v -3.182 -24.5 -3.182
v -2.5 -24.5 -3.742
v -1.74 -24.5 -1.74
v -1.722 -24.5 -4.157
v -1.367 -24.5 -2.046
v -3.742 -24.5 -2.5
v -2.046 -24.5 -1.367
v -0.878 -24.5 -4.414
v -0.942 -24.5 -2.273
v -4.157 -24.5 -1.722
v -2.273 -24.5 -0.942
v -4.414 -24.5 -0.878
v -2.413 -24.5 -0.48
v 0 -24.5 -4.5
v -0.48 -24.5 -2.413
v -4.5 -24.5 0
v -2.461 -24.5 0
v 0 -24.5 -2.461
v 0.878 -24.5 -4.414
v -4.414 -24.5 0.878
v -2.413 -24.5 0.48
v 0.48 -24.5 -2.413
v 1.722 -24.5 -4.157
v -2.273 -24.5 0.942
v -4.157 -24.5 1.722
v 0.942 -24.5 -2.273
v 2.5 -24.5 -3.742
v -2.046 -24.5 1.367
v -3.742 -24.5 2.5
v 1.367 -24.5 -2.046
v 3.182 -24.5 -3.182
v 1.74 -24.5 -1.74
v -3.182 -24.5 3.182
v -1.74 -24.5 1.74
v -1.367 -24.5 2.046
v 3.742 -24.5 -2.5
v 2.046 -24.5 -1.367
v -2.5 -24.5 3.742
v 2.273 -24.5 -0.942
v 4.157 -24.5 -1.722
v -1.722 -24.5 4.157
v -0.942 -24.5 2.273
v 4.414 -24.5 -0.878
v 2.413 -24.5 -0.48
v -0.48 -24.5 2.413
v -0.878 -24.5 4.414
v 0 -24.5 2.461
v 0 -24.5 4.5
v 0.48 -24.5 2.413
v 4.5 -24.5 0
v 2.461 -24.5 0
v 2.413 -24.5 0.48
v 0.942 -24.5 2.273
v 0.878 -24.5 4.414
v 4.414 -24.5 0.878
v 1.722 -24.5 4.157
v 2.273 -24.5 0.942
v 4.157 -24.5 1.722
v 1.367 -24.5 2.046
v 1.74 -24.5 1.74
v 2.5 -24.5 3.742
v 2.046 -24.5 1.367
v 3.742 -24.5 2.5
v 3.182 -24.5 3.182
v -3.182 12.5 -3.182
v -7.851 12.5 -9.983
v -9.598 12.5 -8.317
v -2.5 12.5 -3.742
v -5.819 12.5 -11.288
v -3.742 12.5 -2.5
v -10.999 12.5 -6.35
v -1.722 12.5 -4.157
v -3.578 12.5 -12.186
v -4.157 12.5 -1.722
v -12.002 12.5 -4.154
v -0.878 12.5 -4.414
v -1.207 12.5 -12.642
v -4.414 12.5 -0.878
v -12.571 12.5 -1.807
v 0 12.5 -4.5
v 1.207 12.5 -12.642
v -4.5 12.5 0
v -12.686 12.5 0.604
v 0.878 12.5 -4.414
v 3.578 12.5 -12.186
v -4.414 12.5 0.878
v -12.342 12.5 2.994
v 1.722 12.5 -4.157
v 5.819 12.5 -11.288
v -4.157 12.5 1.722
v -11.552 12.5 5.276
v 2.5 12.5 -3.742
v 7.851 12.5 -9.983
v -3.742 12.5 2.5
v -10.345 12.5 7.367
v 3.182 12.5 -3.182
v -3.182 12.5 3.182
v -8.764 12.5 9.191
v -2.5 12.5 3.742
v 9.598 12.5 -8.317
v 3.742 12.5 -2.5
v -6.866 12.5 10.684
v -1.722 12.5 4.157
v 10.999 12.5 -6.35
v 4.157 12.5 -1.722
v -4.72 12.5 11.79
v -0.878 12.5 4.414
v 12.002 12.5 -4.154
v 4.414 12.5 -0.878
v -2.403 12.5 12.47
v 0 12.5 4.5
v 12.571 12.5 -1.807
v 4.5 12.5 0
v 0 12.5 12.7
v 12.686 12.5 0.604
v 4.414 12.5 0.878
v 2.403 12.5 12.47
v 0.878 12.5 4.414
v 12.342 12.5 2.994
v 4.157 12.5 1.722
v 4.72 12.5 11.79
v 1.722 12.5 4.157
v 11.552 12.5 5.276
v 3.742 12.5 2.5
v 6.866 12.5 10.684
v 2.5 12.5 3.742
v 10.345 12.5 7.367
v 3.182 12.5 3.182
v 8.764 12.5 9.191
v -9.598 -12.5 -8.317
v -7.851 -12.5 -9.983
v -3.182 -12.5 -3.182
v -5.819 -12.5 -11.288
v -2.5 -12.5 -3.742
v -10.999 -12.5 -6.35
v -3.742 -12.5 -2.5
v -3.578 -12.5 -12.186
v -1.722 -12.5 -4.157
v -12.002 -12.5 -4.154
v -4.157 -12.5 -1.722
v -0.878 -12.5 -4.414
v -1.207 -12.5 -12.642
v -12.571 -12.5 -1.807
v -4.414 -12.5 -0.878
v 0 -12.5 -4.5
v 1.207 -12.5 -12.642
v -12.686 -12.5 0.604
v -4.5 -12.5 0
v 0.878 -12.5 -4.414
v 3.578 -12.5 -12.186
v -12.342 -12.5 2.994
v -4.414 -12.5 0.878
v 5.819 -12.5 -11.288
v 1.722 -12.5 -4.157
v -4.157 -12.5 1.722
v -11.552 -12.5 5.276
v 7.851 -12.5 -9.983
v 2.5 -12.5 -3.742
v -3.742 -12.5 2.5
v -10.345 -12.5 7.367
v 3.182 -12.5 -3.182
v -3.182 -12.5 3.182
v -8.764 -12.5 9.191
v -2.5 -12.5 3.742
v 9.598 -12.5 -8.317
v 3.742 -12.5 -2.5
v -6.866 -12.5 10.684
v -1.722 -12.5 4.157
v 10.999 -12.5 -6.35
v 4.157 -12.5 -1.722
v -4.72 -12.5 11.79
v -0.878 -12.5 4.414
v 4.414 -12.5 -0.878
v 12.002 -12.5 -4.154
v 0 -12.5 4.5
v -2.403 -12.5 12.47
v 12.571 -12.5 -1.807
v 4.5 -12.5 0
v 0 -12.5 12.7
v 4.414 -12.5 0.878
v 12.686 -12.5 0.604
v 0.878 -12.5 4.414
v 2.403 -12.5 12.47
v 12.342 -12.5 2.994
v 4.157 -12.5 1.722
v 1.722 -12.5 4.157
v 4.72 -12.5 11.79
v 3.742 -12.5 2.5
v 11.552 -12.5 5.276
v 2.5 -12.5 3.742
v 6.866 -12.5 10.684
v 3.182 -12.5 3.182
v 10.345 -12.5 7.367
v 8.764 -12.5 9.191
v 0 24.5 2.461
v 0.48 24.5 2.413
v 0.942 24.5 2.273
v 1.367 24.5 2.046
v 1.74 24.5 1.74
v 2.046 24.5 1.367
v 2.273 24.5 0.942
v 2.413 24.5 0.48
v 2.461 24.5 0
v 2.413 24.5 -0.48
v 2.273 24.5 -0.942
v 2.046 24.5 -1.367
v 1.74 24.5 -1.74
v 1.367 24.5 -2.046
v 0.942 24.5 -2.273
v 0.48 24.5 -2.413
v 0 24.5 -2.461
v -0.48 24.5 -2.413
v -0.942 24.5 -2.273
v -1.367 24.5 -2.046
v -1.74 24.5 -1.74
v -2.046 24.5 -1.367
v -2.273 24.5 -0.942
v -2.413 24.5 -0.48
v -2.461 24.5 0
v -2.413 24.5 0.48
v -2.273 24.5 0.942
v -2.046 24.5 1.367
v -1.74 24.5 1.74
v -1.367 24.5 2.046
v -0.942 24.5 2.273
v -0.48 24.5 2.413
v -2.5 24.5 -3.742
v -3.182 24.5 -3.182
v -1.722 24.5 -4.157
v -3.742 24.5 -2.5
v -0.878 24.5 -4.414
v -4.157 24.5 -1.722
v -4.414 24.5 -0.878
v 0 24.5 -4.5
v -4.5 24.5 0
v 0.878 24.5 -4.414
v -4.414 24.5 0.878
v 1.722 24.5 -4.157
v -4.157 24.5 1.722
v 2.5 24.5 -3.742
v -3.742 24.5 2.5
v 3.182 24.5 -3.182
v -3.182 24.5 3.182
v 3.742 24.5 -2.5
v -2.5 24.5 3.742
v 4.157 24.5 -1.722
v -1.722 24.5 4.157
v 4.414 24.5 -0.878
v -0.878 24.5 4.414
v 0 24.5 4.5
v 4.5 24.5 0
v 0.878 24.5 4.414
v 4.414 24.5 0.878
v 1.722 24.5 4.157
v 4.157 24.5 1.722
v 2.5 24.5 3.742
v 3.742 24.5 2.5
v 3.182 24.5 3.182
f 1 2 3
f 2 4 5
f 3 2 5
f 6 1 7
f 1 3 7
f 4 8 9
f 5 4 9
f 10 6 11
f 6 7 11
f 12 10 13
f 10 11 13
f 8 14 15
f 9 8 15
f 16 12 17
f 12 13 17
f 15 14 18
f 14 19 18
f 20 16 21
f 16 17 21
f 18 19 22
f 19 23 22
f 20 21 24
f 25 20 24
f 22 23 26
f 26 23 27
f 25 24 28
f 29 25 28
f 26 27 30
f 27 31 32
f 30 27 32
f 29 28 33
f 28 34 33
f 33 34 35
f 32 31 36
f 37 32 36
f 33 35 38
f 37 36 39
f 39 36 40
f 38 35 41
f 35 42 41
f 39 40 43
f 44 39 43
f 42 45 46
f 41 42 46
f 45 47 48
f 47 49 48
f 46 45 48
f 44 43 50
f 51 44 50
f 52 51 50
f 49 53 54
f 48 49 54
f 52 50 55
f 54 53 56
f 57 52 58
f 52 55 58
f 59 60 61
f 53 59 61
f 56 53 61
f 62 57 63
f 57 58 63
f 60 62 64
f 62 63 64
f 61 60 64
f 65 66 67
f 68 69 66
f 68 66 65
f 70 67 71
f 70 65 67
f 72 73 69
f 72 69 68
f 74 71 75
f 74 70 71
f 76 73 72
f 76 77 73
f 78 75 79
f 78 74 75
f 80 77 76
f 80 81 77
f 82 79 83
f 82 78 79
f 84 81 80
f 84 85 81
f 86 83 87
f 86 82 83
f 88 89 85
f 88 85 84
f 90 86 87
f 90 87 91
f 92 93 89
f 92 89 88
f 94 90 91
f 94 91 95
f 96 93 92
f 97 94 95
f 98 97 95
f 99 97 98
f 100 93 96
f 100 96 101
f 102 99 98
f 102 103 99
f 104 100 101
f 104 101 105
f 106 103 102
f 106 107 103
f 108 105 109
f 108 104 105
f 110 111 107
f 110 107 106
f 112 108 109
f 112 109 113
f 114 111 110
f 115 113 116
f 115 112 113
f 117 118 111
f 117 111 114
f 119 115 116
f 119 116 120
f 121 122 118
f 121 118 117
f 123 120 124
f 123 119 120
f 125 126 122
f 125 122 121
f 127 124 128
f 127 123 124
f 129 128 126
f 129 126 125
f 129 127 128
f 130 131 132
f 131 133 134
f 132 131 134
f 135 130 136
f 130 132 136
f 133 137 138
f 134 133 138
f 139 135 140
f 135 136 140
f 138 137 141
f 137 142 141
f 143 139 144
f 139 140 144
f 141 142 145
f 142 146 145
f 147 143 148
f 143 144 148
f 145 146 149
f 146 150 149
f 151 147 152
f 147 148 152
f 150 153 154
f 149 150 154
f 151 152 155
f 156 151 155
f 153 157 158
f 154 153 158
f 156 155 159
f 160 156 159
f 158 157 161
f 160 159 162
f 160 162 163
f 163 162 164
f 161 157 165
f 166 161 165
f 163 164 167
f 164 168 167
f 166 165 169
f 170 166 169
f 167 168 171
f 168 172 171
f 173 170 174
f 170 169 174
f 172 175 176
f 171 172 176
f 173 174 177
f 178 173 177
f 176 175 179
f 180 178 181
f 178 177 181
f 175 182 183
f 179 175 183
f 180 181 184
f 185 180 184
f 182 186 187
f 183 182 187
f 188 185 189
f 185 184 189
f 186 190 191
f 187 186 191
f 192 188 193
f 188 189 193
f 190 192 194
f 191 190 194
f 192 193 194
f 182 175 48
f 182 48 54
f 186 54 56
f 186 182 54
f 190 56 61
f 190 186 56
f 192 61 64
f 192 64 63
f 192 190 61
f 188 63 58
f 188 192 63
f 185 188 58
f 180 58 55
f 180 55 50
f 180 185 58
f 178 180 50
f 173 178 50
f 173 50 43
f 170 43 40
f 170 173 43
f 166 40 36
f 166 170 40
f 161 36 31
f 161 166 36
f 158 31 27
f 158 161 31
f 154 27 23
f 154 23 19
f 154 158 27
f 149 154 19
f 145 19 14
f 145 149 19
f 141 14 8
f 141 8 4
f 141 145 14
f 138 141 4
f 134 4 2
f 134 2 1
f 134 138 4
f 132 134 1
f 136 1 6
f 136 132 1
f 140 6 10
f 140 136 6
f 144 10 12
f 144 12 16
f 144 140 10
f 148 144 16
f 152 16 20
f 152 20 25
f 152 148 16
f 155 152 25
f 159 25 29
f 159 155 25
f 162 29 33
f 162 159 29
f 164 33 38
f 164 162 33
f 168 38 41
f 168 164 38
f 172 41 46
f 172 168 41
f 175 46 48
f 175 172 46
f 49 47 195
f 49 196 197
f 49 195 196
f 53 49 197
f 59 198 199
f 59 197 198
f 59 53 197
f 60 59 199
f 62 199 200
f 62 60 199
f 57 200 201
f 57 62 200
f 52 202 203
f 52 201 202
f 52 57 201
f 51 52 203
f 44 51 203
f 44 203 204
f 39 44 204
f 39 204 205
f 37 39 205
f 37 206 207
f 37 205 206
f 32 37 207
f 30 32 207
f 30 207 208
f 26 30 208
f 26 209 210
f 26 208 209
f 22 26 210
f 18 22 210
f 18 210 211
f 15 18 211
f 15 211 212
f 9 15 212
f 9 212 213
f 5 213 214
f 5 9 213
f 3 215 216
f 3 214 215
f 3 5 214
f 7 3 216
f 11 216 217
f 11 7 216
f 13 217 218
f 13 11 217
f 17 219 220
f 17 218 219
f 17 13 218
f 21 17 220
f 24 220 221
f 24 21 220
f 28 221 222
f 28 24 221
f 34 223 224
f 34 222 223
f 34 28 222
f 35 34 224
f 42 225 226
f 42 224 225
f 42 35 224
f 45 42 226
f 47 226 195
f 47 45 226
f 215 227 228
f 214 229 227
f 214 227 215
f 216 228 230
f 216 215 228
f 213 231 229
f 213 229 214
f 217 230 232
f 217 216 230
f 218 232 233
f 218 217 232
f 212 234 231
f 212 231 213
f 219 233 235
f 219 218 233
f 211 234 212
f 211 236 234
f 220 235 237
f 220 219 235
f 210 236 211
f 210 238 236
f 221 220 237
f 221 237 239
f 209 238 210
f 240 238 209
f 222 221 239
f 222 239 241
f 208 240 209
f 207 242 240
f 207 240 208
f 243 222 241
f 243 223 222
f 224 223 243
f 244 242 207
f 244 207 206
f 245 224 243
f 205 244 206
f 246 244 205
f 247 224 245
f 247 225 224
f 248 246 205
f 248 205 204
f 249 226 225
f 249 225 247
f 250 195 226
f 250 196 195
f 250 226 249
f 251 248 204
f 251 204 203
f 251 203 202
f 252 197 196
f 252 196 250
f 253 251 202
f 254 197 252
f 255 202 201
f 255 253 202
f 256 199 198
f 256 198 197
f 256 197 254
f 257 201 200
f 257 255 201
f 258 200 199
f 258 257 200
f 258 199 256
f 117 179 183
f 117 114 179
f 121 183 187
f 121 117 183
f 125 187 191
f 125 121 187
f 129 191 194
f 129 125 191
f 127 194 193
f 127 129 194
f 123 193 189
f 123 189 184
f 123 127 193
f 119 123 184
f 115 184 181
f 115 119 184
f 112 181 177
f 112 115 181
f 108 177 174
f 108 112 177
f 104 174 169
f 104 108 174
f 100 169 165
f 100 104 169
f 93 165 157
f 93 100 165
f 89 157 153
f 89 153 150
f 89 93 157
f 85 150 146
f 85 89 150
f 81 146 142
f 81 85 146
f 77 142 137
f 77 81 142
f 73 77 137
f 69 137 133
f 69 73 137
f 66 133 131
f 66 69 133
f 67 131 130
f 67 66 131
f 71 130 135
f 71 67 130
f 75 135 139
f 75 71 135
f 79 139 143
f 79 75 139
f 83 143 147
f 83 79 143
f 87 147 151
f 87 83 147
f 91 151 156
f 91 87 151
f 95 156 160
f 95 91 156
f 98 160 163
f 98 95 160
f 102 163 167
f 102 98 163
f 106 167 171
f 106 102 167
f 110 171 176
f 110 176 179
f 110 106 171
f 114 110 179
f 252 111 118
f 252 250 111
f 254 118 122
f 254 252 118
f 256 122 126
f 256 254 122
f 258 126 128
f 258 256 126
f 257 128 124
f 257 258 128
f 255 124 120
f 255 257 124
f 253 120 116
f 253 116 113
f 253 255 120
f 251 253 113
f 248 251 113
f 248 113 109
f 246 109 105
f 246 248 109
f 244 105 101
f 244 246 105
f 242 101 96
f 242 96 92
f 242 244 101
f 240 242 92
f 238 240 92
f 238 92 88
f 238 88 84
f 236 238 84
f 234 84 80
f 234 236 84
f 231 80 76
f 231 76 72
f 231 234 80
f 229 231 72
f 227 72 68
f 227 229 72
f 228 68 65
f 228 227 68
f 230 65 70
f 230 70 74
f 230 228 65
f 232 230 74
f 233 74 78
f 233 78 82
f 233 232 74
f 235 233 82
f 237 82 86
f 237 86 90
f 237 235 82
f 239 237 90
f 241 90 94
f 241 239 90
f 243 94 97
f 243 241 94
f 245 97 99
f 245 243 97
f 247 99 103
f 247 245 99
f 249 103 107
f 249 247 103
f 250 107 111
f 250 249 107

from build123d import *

# Parameters (mm, degrees)
CROQUIS1_R                 = 12.7
SALIENTE_EXTRUIR1_DEPTH    = 12.5
CROQUIS2_R                 = 4.5
SALIENTE_EXTRUIR2_DEPTH    = 24.5
CORTAR_EXTRUIR1_DEPTH      = 31.378117124
CORTAR_EXTRUIR1_DEPTH_BACK = 31.378117124
CROQUIS3_R                 = 2.460715963


with BuildPart() as part:
    # Croquis1 → Saliente-Extruir1 (new, symmetric)
    with BuildSketch(Plane(origin=(0, 0, 0), x_dir=(1, 0, 0), z_dir=(0, 1, 0))):
        with Locations(Location((0, 0, 0), (0, 0, 270))):
            Circle(CROQUIS1_R)
    extrude(amount=SALIENTE_EXTRUIR1_DEPTH, both=True)

    # Croquis2 → Saliente-Extruir2 (add, symmetric)
    with BuildSketch(Plane(origin=(0, 0, 0), x_dir=(1, 0, 0), z_dir=(0, 1, 0))):
        with Locations(Location((0, 0, 0), (0, 0, 270))):
            Circle(CROQUIS2_R)
    extrude(amount=SALIENTE_EXTRUIR2_DEPTH, both=True)

    # Croquis3 → Cortar-Extruir1 (cut, two sides: drawn at the far end of the back side and taken through both)
    with BuildSketch(Plane(origin=(0, 0, 0), x_dir=(1, 0, 0), z_dir=(0, 1, 0)).offset(-CORTAR_EXTRUIR1_DEPTH_BACK)):
        with Locations(Location((0, 0, 0), (0, 0, 270))):
            Circle(CROQUIS3_R)
    extrude(amount=CORTAR_EXTRUIR1_DEPTH + CORTAR_EXTRUIR1_DEPTH_BACK, mode=Mode.SUBTRACT)


solid = part.part
